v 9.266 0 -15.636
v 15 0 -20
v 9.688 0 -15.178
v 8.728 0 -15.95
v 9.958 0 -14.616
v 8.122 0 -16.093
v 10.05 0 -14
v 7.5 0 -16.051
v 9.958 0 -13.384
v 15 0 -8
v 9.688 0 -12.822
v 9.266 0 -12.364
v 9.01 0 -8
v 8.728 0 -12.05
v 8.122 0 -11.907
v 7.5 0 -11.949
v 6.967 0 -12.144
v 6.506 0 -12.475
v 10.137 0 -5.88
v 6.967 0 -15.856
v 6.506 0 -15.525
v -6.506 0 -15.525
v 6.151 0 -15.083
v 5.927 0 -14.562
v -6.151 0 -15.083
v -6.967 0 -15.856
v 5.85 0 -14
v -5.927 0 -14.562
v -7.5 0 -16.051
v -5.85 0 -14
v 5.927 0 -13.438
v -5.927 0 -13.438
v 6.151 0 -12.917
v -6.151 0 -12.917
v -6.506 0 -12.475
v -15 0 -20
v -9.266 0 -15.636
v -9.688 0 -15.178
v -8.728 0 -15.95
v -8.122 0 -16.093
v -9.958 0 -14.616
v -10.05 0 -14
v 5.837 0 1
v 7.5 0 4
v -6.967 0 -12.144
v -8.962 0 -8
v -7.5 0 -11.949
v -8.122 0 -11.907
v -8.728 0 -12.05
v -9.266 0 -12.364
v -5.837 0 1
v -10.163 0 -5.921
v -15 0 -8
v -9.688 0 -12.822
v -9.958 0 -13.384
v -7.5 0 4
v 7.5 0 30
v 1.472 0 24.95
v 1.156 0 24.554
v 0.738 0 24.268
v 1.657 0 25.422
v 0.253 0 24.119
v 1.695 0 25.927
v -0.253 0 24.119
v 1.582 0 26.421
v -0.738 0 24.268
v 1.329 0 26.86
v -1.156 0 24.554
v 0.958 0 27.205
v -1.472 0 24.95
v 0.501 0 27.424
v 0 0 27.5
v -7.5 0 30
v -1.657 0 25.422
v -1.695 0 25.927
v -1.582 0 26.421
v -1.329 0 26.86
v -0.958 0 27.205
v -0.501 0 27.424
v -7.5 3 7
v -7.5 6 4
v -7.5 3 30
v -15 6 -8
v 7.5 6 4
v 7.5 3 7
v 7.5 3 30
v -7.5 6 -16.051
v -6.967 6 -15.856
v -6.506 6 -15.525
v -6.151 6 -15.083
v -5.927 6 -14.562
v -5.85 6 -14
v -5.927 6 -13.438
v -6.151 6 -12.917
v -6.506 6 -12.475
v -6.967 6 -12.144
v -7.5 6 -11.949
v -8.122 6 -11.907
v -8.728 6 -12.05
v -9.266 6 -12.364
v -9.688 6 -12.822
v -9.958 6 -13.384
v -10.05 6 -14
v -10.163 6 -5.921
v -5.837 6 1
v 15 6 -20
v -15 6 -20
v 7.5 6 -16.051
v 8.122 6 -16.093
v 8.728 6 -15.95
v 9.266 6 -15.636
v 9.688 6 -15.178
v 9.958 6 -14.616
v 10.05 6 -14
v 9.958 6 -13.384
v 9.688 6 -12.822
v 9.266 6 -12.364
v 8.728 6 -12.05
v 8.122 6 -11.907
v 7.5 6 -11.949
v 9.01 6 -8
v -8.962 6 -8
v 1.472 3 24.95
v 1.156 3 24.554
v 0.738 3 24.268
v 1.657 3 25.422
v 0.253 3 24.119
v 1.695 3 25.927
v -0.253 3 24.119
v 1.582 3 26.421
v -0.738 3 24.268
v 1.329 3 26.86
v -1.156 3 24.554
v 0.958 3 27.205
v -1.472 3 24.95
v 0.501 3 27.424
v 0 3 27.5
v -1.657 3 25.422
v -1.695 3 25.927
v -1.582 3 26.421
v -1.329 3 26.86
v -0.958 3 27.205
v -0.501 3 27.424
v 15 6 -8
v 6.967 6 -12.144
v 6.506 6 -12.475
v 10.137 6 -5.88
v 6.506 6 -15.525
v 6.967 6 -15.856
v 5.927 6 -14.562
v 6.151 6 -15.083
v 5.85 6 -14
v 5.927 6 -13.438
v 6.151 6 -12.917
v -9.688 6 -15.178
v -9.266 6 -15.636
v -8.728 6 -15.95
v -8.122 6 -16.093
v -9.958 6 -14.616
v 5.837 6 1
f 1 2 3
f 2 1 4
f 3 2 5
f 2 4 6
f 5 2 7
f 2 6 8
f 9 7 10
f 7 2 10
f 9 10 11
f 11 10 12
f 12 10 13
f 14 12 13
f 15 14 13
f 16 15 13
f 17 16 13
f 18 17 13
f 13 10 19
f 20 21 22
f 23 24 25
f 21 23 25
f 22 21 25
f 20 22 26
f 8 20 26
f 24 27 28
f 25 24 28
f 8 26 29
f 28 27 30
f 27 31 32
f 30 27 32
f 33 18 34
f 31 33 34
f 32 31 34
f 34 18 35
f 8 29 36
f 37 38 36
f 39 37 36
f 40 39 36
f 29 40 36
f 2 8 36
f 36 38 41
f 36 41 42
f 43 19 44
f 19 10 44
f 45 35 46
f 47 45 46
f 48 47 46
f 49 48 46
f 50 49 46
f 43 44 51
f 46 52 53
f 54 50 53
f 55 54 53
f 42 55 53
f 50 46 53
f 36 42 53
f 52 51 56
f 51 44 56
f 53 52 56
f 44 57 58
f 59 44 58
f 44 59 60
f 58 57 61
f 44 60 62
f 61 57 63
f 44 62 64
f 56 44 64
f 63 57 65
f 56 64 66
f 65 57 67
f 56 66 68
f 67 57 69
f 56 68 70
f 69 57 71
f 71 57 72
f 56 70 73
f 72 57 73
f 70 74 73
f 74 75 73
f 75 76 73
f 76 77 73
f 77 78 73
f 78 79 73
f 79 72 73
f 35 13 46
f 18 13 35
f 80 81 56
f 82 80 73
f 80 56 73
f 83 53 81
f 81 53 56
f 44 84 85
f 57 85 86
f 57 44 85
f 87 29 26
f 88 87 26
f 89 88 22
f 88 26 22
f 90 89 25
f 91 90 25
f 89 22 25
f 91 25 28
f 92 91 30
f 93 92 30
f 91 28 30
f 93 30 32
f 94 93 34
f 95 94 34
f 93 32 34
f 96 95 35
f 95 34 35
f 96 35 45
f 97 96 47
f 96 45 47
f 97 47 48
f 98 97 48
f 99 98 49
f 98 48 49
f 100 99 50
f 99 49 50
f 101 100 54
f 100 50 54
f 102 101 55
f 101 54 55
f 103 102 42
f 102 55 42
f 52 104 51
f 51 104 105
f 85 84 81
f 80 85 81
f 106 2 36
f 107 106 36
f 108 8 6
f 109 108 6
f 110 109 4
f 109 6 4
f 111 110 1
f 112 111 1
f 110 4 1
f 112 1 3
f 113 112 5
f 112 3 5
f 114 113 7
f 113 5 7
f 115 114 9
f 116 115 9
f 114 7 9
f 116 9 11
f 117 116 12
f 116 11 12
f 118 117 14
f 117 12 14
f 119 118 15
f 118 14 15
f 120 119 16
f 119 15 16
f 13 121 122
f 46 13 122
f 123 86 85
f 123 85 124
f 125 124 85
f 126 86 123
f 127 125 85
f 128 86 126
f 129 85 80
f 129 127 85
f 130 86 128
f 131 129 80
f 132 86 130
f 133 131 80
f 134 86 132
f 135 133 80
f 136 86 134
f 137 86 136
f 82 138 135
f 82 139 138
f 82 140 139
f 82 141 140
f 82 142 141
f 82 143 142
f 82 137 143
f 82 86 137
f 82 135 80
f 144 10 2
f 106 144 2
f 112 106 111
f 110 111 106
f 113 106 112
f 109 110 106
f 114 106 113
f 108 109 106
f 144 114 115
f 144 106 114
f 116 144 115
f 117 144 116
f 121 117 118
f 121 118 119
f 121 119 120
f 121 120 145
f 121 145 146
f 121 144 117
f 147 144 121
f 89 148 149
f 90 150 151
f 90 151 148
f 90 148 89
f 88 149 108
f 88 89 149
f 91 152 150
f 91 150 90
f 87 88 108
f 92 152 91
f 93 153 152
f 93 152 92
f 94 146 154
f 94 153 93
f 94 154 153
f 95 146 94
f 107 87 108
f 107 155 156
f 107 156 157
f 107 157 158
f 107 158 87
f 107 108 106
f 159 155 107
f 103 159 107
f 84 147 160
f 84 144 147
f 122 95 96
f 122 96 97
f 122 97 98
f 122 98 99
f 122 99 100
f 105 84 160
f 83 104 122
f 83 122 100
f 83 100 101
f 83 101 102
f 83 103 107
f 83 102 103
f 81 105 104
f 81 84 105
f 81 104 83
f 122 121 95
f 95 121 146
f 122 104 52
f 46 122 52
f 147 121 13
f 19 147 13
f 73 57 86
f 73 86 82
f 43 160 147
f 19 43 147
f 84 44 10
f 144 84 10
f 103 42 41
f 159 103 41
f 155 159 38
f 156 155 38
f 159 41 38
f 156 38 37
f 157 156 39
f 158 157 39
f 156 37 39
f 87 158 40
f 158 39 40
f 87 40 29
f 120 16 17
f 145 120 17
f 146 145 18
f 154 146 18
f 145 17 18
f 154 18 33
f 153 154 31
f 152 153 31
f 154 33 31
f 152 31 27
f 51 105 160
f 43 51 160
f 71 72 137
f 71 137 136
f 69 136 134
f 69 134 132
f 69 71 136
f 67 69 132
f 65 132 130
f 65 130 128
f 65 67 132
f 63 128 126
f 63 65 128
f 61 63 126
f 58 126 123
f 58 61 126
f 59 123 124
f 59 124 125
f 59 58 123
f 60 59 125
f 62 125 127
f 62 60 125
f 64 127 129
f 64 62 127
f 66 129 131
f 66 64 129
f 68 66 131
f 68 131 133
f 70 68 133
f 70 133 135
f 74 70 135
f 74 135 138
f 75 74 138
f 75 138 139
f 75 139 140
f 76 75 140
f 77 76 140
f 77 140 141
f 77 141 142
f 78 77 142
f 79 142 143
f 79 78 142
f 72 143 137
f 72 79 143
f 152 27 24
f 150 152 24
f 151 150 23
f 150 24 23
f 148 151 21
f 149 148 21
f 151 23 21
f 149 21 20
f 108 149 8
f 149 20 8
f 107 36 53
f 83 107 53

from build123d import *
from OCP.BRepFilletAPI import BRepFilletAPI_MakeChamfer

# Parameters (mm, degrees)
SKETCH1_W           = 15
SKETCH1_H           = 12
BOSS_EXTRUDE1_DEPTH = 6
SKETCH1_3_W         = 15
SKETCH1_3_H         = 26
SKETCH1_3_R         = 1.7
BOSS_EXTRUDE2_DEPTH = 3
CHAMFER1_SIZE       = 3
CUT_EXTRUDE1_DEPTH  = 6
CHAMFER2_SIZE       = 2.5
CHAMFER2_SIZE2      = 2.451963608


with BuildPart() as part:
    # Sketch1 → Boss-Extrude1 (new body)
    with BuildSketch(Plane(origin=(0, 0, 0), x_dir=(-1, 0, 0), z_dir=(0, 1, 0))):
        with BuildLine():
            Line((-7.5, -8), (-15, -8))
            Line((-15, -8), (-15, -20))
            Line((-15, -20), (-7.5, -20))
            Line((-7.5, -20), (-7.5, -16.05121915))
            ThreePointArc((-7.5, -16.05121915), (-10.05, -14), (-7.5, -11.94878085))
            Line((-7.5, -11.94878085), (-7.5, -8))
        make_face()
        with BuildLine():
            Line((7.5, -8), (-7.5, -8))
            Line((-7.5, -8), (-7.5, -11.94878085))
            ThreePointArc((-7.5, -11.94878085), (-6.313693183, -12.683755342), (-5.85, -14))
            ThreePointArc((-5.85, -14), (-6.313693183, -15.316244658), (-7.5, -16.05121915))
            Line((-7.5, -16.05121915), (-7.5, -20))
            Line((-7.5, -20), (7.5, -20))
            Line((7.5, -20), (7.5, -16.05121915))
            ThreePointArc((7.5, -16.05121915), (5.85, -14), (7.5, -11.94878085))
            Line((7.5, -11.94878085), (7.5, -8))
        make_face()
        with BuildLine():
            Line((15, -8), (7.5, -8))
            Line((7.5, -8), (7.5, -11.94878085))
            ThreePointArc((7.5, -11.94878085), (9.266244658, -12.363693183), (10.05, -14))
            ThreePointArc((10.05, -14), (9.266244658, -15.636306817), (7.5, -16.05121915))
            Line((7.5, -16.05121915), (7.5, -20))
            Line((7.5, -20), (15, -20))
            Line((15, -20), (15, -8))
        make_face()
        Polygon((15, -8), (7.5, 4), (7.5, -8), align=None)
        with Locations((0, -2)):
            Rectangle(SKETCH1_W, SKETCH1_H)
        Polygon((-7.5, 4), (-15, -8), (-7.5, -8), align=None)
    extrude(amount=BOSS_EXTRUDE1_DEPTH)

    # Sketch1<3> → Boss-Extrude2 (add)
    with BuildSketch(Plane(origin=(0, 0, 0), x_dir=(-1, 0, 0), z_dir=(0, 1, 0))):
        with Locations((0, 17)):
            Rectangle(SKETCH1_3_W, SKETCH1_3_H)
        with Locations(Location((0, 25.8, 0), (0, 0, 90))):
            Circle(SKETCH1_3_R, mode=Mode.SUBTRACT)
    extrude(amount=BOSS_EXTRUDE2_DEPTH)

    # Chamfer1
    chamfer1_edges = [part.edges().sort_by_distance(p)[0] for p in [
        (0, 3, 4),
    ]]
    chamfer(chamfer1_edges, length=CHAMFER1_SIZE - 0.0001)  # a hair under: the kernel refuses the full size

    # Sketch2 → Cut-Extrude1 (cut)
    with BuildSketch(Plane(origin=(0, 6, 0), x_dir=(-1, 0, 0), z_dir=(0, 1, 0))):
        Polygon((-5.837257075, 1), (-11.462257075, -8), (11.462257075, -8), (5.837257075, 1), align=None)
    extrude(amount=-CUT_EXTRUDE1_DEPTH, mode=Mode.SUBTRACT)

    # Chamfer2: one chamfer whose edges measure the first distance from different faces: ONE call of the kernel's chamfer builder (chamfer() names one face for all edges)
    chamfer2_edges_1 = [part.edges().sort_by_distance(p)[0] for p in [
        (-11.462257075, 3, -8),
    ]]
    chamfer2_side_1 = [part.faces().sort_by_distance(p)[0] for p in [
        (0, 3, -8),
    ]]
    chamfer2_edges_2 = [part.edges().sort_by_distance(p)[0] for p in [
        (11.462257075, 3, -8),
    ]]
    chamfer2_side_2 = [part.faces().sort_by_distance(p)[0] for p in [
        (8.649757075, 3, -3.5),
    ]]
    chamfer2 = BRepFilletAPI_MakeChamfer(part.part.solid().wrapped)
    for e in chamfer2_edges_1:
        chamfer2.Add(CHAMFER2_SIZE, CHAMFER2_SIZE2, e.wrapped, chamfer2_side_1[0].wrapped)  # the first distance lies on this face
    for e in chamfer2_edges_2:
        chamfer2.Add(CHAMFER2_SIZE, CHAMFER2_SIZE2, e.wrapped, chamfer2_side_2[0].wrapped)  # the first distance lies on this face
    add(Compound.cast(chamfer2.Shape()), mode=Mode.REPLACE)


solid = part.part
